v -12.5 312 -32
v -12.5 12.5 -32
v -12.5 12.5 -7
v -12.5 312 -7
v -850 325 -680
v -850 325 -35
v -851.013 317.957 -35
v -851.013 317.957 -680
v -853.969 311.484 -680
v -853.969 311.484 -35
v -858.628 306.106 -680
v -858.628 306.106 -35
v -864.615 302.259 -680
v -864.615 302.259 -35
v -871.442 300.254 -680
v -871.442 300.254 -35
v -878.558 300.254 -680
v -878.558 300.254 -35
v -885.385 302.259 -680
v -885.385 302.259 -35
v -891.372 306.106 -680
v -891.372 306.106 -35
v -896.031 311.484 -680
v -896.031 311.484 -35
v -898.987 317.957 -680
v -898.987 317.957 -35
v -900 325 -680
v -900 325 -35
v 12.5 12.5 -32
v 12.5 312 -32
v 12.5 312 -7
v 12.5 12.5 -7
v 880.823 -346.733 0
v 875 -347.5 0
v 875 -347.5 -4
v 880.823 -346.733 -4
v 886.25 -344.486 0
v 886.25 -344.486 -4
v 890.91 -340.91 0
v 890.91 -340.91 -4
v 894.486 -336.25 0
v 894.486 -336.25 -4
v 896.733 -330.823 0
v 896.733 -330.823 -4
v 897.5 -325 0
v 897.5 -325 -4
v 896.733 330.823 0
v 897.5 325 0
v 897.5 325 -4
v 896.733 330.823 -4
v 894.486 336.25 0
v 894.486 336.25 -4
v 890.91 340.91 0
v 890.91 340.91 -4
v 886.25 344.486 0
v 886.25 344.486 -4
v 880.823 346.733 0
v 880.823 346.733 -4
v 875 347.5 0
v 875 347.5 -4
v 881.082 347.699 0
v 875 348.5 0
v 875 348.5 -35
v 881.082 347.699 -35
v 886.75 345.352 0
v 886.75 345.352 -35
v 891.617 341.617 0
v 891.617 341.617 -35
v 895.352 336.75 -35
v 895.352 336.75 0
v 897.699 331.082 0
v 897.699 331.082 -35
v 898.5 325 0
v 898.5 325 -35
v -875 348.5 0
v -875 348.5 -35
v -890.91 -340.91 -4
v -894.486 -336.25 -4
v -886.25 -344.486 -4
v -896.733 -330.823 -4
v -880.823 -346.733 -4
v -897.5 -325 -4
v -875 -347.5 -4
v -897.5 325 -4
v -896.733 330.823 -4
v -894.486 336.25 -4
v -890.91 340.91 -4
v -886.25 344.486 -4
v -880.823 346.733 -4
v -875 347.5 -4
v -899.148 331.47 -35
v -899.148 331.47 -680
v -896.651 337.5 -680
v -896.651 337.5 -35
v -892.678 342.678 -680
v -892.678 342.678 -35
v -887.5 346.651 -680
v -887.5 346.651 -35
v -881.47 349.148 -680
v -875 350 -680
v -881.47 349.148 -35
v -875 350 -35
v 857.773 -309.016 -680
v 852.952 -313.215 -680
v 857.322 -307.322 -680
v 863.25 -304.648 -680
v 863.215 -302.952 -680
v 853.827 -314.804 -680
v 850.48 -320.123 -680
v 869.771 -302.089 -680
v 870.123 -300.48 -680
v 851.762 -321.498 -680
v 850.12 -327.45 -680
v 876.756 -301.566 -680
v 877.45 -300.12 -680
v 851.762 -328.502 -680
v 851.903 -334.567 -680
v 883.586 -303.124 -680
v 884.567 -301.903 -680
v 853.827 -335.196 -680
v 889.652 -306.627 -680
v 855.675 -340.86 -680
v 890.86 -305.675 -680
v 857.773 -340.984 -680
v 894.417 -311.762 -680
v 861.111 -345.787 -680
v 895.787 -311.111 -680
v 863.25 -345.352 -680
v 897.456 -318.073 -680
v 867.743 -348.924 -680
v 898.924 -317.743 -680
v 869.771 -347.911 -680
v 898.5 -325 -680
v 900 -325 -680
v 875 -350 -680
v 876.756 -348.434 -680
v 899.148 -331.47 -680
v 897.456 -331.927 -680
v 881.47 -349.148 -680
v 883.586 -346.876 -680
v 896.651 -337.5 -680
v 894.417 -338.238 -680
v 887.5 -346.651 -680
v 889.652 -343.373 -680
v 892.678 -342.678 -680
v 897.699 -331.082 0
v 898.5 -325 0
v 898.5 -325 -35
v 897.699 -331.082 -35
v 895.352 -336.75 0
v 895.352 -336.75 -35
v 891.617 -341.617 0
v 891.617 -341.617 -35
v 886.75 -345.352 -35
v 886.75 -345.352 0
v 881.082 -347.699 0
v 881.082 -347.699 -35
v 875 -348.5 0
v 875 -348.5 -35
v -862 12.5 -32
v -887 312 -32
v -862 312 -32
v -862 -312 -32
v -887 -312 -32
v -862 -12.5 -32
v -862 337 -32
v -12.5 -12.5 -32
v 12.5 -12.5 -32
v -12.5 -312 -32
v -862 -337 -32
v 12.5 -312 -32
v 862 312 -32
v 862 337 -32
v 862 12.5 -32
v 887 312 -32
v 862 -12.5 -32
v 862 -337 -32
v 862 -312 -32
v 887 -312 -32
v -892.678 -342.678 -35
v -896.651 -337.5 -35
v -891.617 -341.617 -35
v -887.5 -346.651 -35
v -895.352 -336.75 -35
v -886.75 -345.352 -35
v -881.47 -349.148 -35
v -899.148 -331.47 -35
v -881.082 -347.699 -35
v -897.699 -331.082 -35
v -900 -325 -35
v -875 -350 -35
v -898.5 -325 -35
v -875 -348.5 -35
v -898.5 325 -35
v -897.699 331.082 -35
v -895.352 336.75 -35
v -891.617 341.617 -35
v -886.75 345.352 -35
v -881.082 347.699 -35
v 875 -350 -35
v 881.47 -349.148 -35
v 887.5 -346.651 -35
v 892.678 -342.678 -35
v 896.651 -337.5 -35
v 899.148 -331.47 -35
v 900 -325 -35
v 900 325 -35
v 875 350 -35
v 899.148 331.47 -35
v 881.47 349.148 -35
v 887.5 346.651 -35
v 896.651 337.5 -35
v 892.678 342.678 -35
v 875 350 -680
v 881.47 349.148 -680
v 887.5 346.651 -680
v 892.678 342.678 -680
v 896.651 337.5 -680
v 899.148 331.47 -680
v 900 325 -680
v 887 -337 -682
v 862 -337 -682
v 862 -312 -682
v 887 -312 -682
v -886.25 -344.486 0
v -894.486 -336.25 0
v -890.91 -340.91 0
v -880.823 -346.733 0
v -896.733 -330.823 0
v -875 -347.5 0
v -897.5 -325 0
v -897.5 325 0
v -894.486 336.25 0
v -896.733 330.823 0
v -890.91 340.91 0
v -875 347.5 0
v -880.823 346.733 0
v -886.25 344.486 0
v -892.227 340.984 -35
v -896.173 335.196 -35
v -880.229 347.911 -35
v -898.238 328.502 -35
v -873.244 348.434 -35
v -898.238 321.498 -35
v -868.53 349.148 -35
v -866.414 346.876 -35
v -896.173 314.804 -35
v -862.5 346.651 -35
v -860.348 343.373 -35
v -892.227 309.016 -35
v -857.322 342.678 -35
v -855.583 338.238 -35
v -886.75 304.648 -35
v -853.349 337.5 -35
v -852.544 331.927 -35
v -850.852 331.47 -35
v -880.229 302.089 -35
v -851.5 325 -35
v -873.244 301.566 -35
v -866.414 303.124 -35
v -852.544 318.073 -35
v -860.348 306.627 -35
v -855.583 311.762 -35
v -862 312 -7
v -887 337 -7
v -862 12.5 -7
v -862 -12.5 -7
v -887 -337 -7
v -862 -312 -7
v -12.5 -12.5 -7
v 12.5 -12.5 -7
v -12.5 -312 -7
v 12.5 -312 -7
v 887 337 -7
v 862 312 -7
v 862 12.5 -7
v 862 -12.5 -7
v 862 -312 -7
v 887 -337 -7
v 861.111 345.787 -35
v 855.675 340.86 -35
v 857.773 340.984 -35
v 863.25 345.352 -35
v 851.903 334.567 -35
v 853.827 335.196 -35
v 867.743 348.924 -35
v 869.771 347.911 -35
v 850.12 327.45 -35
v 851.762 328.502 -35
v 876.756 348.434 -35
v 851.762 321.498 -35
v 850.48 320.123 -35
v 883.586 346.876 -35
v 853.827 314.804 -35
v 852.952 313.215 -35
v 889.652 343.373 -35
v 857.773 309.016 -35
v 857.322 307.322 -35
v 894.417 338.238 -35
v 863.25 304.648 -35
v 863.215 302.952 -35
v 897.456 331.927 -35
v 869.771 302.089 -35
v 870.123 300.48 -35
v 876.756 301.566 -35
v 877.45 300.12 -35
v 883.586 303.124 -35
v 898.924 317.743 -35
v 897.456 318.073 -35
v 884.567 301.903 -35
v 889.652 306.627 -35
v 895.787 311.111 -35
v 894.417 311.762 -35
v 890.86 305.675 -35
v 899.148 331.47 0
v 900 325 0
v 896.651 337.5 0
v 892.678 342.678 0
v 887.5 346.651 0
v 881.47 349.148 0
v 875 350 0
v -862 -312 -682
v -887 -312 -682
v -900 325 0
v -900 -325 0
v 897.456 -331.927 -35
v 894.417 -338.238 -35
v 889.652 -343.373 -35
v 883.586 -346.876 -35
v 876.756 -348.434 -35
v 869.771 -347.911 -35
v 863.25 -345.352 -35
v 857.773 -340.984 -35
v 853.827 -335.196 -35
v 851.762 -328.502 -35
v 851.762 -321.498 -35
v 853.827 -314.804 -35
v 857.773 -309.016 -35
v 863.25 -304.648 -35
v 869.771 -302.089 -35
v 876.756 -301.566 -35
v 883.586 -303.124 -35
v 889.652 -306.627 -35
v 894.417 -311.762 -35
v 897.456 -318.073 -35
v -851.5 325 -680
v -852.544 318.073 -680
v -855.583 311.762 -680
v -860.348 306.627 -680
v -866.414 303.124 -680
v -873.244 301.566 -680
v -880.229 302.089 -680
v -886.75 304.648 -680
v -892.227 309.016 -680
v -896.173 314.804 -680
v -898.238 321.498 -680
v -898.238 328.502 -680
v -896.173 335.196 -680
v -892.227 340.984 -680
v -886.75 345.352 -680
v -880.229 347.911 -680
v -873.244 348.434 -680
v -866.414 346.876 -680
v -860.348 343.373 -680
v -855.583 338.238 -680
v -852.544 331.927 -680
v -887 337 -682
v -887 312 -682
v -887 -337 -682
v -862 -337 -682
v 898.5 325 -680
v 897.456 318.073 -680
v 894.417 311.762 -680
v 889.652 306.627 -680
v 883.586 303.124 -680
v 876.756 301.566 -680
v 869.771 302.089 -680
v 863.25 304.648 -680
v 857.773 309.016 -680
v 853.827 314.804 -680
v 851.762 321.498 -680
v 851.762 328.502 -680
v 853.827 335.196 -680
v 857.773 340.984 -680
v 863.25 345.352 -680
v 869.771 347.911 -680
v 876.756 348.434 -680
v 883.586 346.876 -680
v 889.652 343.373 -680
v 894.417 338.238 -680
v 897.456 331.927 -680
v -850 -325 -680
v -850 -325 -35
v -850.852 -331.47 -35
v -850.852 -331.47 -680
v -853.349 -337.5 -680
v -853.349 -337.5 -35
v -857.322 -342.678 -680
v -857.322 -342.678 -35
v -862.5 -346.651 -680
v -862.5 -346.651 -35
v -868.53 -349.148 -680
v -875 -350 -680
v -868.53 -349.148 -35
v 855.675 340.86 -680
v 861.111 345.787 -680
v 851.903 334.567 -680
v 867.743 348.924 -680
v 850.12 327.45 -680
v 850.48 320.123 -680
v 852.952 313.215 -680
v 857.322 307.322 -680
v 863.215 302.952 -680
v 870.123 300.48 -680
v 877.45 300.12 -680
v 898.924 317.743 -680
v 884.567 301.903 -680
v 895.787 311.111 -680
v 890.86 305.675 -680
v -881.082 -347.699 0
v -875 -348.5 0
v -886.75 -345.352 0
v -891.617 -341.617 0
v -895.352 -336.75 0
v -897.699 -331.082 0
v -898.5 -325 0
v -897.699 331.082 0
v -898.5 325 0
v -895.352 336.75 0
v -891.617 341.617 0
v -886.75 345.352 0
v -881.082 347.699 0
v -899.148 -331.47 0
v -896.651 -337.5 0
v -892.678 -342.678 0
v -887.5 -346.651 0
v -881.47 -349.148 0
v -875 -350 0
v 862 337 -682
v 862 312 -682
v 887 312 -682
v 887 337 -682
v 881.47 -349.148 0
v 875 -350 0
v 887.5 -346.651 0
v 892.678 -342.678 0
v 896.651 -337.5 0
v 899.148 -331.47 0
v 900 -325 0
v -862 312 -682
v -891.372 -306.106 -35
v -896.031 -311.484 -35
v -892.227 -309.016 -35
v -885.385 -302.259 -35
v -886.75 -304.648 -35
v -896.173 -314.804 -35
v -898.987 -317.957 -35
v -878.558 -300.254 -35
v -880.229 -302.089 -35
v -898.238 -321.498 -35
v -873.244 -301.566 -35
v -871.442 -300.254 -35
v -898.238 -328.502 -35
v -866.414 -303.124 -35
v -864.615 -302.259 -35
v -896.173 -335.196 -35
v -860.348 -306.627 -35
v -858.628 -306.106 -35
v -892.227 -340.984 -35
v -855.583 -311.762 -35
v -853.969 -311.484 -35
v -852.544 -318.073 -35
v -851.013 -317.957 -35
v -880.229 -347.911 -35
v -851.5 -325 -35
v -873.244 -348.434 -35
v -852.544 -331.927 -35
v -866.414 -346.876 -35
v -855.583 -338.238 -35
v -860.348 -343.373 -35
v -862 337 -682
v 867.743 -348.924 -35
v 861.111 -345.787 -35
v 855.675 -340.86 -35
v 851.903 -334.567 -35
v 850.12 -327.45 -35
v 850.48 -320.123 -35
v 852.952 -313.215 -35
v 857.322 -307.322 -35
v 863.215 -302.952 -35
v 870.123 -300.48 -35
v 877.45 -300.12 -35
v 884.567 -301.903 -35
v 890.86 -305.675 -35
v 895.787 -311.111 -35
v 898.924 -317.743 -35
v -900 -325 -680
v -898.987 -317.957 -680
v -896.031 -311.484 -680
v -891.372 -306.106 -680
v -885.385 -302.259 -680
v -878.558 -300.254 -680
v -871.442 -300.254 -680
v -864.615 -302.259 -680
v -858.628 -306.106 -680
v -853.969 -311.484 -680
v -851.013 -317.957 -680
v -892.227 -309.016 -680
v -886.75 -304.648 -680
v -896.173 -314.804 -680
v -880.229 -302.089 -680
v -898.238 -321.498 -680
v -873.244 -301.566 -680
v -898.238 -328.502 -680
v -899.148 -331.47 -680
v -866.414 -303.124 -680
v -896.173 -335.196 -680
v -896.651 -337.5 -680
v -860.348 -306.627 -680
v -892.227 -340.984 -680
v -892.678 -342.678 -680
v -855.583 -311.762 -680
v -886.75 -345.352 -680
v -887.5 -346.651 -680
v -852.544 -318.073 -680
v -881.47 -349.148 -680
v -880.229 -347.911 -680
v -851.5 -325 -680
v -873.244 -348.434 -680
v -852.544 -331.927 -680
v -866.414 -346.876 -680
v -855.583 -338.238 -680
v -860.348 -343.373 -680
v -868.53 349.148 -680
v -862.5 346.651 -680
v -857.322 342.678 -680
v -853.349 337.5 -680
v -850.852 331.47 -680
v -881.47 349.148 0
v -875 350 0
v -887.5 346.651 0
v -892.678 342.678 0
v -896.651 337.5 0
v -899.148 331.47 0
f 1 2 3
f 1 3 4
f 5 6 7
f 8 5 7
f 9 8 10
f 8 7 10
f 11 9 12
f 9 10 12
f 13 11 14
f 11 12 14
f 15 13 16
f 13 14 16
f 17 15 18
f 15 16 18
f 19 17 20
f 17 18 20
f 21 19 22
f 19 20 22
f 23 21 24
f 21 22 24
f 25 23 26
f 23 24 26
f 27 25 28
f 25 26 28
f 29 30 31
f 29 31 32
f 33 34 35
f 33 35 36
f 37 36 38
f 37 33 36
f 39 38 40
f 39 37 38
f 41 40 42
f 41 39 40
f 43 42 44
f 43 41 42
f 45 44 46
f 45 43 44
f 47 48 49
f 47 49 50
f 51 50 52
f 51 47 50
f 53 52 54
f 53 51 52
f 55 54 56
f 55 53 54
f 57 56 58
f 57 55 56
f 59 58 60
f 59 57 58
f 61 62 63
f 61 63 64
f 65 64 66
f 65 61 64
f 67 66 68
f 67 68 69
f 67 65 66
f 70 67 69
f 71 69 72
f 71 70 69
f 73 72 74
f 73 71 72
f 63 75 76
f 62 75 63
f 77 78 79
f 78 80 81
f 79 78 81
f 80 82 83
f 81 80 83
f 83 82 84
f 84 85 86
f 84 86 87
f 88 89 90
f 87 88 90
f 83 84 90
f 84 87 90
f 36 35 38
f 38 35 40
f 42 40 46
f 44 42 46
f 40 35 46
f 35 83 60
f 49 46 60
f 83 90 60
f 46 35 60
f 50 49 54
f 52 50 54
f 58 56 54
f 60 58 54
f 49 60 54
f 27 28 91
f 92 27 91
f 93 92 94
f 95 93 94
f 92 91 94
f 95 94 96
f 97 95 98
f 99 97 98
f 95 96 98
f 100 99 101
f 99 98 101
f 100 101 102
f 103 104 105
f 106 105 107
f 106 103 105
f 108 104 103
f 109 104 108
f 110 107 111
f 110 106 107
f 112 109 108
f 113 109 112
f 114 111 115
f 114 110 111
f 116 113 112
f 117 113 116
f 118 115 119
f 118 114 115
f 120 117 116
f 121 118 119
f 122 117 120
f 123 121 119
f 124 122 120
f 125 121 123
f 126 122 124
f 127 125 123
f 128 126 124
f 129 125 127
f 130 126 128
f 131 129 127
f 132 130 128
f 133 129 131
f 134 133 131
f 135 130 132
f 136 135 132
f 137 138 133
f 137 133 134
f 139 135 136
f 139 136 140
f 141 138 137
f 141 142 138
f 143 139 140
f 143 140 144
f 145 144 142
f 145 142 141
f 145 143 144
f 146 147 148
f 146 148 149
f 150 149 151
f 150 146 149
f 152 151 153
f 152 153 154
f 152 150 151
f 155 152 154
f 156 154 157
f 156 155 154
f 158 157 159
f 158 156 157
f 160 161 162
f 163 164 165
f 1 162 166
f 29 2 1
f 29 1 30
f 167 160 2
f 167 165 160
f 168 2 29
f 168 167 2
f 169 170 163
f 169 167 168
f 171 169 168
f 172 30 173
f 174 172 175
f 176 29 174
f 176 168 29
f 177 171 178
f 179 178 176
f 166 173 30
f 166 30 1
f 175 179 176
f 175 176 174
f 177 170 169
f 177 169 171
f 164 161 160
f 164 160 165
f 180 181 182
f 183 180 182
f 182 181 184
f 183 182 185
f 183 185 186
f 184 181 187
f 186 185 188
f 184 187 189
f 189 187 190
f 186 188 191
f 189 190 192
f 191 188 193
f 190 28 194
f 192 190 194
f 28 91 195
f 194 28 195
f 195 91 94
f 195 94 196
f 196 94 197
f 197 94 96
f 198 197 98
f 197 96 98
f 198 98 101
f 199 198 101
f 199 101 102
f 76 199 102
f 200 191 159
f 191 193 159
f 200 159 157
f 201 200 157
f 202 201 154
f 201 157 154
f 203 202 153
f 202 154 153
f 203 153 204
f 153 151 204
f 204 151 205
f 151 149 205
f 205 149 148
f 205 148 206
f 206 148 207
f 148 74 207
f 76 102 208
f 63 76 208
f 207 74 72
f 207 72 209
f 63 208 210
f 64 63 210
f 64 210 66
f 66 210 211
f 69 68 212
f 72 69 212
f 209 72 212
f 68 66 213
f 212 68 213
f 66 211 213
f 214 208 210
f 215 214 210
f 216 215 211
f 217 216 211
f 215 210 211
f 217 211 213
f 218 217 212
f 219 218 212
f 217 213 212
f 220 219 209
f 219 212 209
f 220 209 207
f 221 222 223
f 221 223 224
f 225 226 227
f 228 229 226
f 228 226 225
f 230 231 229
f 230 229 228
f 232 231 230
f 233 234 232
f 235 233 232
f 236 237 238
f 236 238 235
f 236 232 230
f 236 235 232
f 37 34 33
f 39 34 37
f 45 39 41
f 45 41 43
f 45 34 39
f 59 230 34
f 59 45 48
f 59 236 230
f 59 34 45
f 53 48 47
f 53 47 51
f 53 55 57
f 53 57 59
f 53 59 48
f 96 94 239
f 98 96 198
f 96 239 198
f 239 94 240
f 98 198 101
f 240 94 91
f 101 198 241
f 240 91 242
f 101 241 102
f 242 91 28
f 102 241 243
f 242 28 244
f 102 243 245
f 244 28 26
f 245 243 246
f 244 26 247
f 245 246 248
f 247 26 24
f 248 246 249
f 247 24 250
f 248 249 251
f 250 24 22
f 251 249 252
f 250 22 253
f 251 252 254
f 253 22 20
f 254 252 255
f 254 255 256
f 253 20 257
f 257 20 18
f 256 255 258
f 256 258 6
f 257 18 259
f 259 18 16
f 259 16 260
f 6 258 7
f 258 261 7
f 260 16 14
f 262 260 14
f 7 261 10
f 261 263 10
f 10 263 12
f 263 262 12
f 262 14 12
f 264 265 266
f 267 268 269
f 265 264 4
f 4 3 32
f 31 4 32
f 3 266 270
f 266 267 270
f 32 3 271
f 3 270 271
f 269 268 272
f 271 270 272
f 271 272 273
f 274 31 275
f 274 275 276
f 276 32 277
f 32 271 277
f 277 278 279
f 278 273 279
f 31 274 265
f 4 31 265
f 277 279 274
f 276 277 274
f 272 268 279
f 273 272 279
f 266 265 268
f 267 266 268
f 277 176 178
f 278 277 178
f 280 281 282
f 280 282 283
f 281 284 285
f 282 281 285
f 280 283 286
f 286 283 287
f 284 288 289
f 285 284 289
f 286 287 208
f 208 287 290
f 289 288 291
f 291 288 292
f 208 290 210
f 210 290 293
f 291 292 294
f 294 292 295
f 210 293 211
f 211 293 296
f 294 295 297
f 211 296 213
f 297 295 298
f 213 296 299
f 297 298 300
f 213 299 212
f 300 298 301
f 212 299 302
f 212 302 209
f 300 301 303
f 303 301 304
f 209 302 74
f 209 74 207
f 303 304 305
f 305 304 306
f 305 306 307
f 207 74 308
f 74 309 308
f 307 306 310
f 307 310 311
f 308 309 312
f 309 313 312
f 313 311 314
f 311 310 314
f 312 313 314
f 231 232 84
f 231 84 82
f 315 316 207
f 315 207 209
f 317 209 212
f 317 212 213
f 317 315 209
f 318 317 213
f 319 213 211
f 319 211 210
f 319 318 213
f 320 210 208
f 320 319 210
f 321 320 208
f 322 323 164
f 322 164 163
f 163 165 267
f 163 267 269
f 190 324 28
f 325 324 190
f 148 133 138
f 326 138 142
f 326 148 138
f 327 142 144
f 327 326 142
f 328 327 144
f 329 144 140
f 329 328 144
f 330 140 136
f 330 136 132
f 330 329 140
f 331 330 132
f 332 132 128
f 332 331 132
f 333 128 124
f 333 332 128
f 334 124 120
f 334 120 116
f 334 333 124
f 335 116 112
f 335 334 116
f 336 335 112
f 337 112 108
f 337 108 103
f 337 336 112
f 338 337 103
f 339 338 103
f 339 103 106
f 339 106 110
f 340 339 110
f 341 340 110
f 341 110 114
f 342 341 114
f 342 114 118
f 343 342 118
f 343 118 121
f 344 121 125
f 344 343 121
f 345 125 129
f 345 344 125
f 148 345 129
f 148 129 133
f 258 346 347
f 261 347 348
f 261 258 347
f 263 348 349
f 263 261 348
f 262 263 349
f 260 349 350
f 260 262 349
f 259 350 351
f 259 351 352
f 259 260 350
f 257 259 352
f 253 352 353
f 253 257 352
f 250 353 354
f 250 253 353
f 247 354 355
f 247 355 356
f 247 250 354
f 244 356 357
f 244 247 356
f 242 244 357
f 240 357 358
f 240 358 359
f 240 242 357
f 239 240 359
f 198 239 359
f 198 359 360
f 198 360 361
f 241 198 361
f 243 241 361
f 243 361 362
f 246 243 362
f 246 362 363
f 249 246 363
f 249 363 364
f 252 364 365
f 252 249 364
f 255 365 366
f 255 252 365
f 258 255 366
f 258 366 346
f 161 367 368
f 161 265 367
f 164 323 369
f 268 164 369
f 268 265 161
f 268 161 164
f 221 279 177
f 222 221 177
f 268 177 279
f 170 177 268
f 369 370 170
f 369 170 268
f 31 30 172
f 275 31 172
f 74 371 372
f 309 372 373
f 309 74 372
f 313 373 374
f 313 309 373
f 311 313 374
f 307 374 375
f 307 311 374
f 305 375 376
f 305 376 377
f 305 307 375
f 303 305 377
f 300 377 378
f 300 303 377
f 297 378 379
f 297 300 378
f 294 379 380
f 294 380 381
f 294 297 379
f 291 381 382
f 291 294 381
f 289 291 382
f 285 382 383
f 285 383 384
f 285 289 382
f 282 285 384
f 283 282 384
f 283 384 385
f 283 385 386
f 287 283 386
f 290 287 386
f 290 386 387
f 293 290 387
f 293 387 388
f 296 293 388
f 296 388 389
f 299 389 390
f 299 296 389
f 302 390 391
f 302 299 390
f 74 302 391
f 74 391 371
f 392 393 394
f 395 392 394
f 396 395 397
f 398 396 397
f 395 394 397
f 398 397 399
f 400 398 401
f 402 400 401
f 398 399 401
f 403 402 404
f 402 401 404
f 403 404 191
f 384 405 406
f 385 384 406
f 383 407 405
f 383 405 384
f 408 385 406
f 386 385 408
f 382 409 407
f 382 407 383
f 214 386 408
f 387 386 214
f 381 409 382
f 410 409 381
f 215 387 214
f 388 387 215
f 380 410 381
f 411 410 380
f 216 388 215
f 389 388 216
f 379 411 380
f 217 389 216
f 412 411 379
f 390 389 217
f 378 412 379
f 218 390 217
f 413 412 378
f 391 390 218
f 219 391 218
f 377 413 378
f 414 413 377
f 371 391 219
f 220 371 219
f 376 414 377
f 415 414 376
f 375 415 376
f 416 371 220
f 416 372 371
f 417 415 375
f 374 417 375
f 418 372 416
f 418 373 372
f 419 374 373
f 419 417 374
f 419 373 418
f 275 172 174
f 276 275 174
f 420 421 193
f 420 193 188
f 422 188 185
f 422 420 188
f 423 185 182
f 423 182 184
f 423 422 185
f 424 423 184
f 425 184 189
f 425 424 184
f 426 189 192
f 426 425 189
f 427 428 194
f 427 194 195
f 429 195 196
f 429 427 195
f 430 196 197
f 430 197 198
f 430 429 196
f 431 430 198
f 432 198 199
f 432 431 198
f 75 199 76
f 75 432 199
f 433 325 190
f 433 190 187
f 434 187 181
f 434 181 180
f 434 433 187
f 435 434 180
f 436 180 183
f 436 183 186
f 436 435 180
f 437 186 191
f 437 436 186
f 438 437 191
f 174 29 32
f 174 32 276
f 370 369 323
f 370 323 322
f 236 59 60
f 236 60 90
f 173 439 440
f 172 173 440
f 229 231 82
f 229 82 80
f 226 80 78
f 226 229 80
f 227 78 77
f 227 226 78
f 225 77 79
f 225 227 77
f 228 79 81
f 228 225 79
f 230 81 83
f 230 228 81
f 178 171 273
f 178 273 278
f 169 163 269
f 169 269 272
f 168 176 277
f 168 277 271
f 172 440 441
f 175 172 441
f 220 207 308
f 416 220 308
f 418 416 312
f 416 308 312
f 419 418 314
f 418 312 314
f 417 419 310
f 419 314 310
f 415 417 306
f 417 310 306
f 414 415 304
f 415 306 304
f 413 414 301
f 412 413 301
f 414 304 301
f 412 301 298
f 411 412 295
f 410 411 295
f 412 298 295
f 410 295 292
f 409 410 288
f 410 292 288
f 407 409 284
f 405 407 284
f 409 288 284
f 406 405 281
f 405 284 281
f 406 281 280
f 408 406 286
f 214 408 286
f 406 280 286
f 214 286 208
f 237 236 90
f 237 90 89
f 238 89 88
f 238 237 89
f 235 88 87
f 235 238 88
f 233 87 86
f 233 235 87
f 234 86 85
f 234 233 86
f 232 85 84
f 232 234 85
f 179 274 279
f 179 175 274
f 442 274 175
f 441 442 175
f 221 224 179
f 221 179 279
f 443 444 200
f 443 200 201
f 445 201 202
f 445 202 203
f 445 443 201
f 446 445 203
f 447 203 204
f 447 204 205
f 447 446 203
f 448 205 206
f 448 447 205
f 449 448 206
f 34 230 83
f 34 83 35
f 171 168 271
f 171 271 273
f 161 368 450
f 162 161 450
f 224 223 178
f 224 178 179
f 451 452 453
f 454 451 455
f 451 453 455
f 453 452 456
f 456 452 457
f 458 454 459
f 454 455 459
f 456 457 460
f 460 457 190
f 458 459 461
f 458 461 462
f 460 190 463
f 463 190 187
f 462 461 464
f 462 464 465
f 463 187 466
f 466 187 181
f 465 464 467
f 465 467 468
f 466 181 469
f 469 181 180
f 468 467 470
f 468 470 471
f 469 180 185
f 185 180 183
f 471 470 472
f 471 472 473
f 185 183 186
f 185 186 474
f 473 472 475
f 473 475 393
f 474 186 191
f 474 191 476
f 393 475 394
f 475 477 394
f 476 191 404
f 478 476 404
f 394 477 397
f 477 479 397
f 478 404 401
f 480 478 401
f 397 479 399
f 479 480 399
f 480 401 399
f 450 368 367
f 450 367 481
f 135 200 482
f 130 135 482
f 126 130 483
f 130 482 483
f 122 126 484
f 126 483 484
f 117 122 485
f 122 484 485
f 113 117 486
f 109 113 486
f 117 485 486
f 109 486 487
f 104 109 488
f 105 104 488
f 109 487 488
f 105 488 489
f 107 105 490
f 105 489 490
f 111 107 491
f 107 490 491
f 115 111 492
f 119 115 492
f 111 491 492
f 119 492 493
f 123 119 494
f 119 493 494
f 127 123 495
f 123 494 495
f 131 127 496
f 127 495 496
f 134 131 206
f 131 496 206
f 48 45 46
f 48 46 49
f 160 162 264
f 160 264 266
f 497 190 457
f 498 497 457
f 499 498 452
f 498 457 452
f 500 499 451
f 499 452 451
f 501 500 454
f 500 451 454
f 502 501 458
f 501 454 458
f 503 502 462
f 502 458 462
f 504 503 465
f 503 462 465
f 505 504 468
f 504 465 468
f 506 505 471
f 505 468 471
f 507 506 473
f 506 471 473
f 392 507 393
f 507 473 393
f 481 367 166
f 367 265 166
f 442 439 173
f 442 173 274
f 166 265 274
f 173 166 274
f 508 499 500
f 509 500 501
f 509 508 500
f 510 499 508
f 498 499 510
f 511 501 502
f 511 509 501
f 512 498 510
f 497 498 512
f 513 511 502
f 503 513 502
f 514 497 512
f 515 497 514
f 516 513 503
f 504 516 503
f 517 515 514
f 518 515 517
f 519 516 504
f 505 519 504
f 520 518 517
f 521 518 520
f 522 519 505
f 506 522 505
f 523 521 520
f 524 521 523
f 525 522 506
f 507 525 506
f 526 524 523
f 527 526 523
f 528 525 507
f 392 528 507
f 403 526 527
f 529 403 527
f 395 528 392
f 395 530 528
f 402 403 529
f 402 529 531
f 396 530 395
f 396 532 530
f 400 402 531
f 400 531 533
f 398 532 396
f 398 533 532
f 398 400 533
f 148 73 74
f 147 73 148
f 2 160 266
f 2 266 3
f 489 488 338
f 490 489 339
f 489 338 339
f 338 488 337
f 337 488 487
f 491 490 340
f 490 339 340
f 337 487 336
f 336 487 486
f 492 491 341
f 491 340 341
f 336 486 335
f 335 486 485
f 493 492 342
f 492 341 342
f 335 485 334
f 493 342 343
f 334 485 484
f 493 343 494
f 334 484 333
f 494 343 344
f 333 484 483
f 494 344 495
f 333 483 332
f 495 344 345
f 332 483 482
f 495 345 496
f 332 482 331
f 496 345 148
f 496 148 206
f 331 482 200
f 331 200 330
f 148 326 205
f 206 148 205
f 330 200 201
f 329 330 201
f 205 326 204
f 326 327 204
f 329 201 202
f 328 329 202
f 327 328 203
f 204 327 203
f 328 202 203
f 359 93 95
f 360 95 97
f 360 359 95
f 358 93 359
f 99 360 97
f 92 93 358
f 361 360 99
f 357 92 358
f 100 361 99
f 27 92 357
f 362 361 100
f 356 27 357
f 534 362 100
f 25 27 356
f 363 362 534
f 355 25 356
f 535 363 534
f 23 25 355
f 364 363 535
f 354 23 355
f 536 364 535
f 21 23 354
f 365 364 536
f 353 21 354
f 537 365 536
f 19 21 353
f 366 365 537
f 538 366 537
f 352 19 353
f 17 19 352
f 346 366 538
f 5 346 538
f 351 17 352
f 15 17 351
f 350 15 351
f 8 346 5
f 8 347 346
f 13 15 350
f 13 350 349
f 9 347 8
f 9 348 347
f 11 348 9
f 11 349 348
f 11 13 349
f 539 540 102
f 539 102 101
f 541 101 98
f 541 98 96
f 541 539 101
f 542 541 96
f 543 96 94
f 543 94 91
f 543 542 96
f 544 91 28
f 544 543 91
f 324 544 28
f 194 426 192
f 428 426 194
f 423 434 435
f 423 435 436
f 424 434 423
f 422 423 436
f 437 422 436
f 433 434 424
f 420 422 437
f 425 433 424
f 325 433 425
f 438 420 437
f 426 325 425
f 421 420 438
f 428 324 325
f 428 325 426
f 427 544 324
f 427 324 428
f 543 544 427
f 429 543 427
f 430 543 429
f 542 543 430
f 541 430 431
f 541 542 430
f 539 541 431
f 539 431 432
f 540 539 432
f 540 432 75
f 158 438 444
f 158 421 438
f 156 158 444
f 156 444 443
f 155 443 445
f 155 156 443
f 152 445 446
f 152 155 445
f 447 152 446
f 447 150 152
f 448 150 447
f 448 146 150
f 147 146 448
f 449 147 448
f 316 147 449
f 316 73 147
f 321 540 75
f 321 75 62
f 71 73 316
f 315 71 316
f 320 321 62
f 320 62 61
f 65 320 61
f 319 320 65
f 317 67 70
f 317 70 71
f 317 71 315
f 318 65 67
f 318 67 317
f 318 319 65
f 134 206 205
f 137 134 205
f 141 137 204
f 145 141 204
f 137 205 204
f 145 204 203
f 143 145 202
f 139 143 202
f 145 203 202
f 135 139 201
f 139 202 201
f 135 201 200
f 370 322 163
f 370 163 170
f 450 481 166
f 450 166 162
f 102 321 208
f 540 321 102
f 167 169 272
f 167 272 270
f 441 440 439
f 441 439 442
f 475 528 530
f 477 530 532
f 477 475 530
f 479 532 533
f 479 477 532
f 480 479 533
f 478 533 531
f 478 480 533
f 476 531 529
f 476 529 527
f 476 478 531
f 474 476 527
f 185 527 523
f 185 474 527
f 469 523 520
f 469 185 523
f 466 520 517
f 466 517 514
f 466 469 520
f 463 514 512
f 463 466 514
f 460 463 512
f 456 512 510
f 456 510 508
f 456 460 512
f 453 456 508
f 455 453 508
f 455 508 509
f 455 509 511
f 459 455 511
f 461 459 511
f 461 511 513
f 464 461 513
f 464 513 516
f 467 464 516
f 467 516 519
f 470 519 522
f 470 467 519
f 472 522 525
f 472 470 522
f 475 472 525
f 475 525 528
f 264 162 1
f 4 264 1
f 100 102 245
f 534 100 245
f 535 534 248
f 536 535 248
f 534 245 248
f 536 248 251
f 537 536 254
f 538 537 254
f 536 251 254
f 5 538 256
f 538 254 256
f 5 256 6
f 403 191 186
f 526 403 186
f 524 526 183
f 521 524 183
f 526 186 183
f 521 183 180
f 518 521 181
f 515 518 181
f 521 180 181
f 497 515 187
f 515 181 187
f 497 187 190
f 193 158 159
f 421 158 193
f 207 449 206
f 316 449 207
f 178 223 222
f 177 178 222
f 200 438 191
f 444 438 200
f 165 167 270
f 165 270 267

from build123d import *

# Parameters (mm, degrees)
F1_DEPTH  = 35
F3_DEPTH  = 4
F5_W      = 1724
F5_H      = 624
F6_DEPTH  = 25
F8_W      = 25
F8_H      = 25
F9_DEPTH  = 650
F11_R     = 23.5
F12_DEPTH = 645
F15_DEPTH = 25


with BuildPart() as f1:
    # F0 (on Top) → F1 (new body)
    with BuildSketch(Plane.XY):
        with BuildLine():
            ThreePointArc((900, 325), (892.6776695297, 342.6776695297), (875, 350))
            Line((875, 350), (-850, 350))
            Line((-850, 350), (-875, 350))
            ThreePointArc((-875, 350), (-892.6776695297, 342.6776695297), (-900, 325))
            Line((-900, 325), (-900, 300))
            Line((-900, 300), (-900, -325))
            ThreePointArc((-900, -325), (-892.6776695297, -342.6776695297), (-875, -350))
            Line((-875, -350), (875, -350))
            ThreePointArc((875, -350), (892.6776695297, -342.6776695297), (900, -325))
            Line((900, -325), (900, 325))
        make_face()
        with BuildLine():
            Line((-898.5, -325), (-898.5, 300))
            Line((-898.5, 300), (-898.5, 325))
            ThreePointArc((-898.5, 325), (-891.6170093579, 341.6170093579), (-875, 348.5))
            Line((-875, 348.5), (875, 348.5))
            ThreePointArc((875, 348.5), (891.6170093579, 341.6170093579), (898.5, 325))
            Line((898.5, 325), (898.5, -325))
            ThreePointArc((898.5, -325), (891.6170093579, -341.6170093579), (875, -348.5))
            Line((875, -348.5), (-875, -348.5))
            ThreePointArc((-875, -348.5), (-891.6170093579, -341.6170093579), (-898.5, -325))
        make_face(mode=Mode.SUBTRACT)
    extrude(amount=-F1_DEPTH)


with BuildPart() as f3:
    # F2 (on Top) → F3 (new body)
    with BuildSketch(Plane.XY):
        with BuildLine():
            Line((-875, -347.5), (875, -347.5))
            ThreePointArc((875, -347.5), (890.9099025767, -340.9099025767), (897.5, -325))
            Line((897.5, -325), (897.5, 325))
            ThreePointArc((897.5, 325), (890.9099025767, 340.9099025767), (875, 347.5))
            Line((875, 347.5), (-875, 347.5))
            ThreePointArc((-875, 347.5), (-890.9099025767, 340.9099025767), (-897.5, 325))
            Line((-897.5, 325), (-897.5, -325))
            ThreePointArc((-897.5, -325), (-890.9099025767, -340.9099025767), (-875, -347.5))
        make_face()
    extrude(amount=-F3_DEPTH)


with BuildPart() as f6:
    # F5 (on offset) → F6 (new body)
    with BuildSketch(Plane(origin=(0, 0, -32), x_dir=(1, 0, 0), z_dir=(0, 0, -1))):
        Polygon((-887, -337), (-875, -337), (887, -337), (887, 337), (-875, 337), (-887, 337), (-887, 325), (-887, -325), align=None)
        Rectangle(F5_W, F5_H, mode=Mode.SUBTRACT)
    extrude(amount=-F6_DEPTH)

    # F8 (on face) → F9 (join)
    with BuildSketch(Plane(origin=(0, 0, -32), x_dir=(1, 0, 0), z_dir=(0, 0, -1))):
        with Locations((-874.5, -324.5)):
            Rectangle(F8_W, F8_H)
        with Locations((-874.5, 324.5)):
            Rectangle(F8_W, F8_H)
        with Locations((874.5, 324.5)):
            Rectangle(F8_W, F8_H)
        with Locations((874.5, -324.5)):
            Rectangle(F8_W, F8_H)
    extrude(amount=F9_DEPTH)

    # F14 (on offset) → F15 (join)
    with BuildSketch(Plane(origin=(0, 0, -32), x_dir=(1, 0, 0), z_dir=(0, 0, -1))):
        Polygon((-862, 12.5), (-862, -12.5), (-12.5, -12.5), (-12.5, -312), (12.5, -312), (12.5, -12.5), (862, -12.5), (862, 12.5), (12.5, 12.5), (12.5, 312), (-12.5, 312), (-12.5, 12.5), align=None)
    extrude(amount=-F15_DEPTH)


with BuildPart() as f12:
    # F11 (on offset) → F12 (new body)
    with BuildSketch(Plane(origin=(0, 0, -35), x_dir=(1, 0, 0), z_dir=(0, 0, -1))):
        with BuildLine():
            ThreePointArc((-900, -325), (-892.6776695297, -342.6776695297), (-875, -350))
            ThreePointArc((-875, -350), (-857.3223304703, -342.6776695297), (-850, -325))
            ThreePointArc((-850, -325), (-875, -300), (-900, -325))
        make_face()
        with Locations((-875, -325)):
            Circle(F11_R, mode=Mode.SUBTRACT)
    extrude(amount=F12_DEPTH)


with BuildPart() as f12b:
    # F11 (on offset) → F12, piece 2 (new body)
    with BuildSketch(Plane(origin=(0, 0, -35), x_dir=(1, 0, 0), z_dir=(0, 0, -1))):
        with BuildLine():
            ThreePointArc((900, -325), (857.3223304703, -307.3223304703), (875, -350))
            ThreePointArc((875, -350), (892.6776695297, -342.6776695297), (900, -325))
        make_face()
        with Locations((875, -325)):
            Circle(F11_R, mode=Mode.SUBTRACT)
    extrude(amount=F12_DEPTH)


with BuildPart() as f12c:
    # F11 (on offset) → F12, piece 3 (new body)
    with BuildSketch(Plane(origin=(0, 0, -35), x_dir=(1, 0, 0), z_dir=(0, 0, -1))):
        with BuildLine():
            ThreePointArc((-850, 325), (-857.3223304703, 342.6776695297), (-875, 350))
            ThreePointArc((-875, 350), (-892.6776695297, 342.6776695297), (-900, 325))
            ThreePointArc((-900, 325), (-875, 300), (-850, 325))
        make_face()
        with Locations((-875, 325)):
            Circle(F11_R, mode=Mode.SUBTRACT)
    extrude(amount=F12_DEPTH)


with BuildPart() as f12d:
    # F11 (on offset) → F12, piece 4 (new body)
    with BuildSketch(Plane(origin=(0, 0, -35), x_dir=(1, 0, 0), z_dir=(0, 0, -1))):
        with BuildLine():
            ThreePointArc((900, 325), (892.6776695297, 342.6776695297), (875, 350))
            ThreePointArc((875, 350), (857.3223304703, 307.3223304703), (900, 325))
        make_face()
        with Locations((875, 325)):
            Circle(F11_R, mode=Mode.SUBTRACT)
    extrude(amount=F12_DEPTH)


solid = Compound([f1.part, f3.part, f6.part, f12.part, f12b.part, f12c.part, f12d.part])
